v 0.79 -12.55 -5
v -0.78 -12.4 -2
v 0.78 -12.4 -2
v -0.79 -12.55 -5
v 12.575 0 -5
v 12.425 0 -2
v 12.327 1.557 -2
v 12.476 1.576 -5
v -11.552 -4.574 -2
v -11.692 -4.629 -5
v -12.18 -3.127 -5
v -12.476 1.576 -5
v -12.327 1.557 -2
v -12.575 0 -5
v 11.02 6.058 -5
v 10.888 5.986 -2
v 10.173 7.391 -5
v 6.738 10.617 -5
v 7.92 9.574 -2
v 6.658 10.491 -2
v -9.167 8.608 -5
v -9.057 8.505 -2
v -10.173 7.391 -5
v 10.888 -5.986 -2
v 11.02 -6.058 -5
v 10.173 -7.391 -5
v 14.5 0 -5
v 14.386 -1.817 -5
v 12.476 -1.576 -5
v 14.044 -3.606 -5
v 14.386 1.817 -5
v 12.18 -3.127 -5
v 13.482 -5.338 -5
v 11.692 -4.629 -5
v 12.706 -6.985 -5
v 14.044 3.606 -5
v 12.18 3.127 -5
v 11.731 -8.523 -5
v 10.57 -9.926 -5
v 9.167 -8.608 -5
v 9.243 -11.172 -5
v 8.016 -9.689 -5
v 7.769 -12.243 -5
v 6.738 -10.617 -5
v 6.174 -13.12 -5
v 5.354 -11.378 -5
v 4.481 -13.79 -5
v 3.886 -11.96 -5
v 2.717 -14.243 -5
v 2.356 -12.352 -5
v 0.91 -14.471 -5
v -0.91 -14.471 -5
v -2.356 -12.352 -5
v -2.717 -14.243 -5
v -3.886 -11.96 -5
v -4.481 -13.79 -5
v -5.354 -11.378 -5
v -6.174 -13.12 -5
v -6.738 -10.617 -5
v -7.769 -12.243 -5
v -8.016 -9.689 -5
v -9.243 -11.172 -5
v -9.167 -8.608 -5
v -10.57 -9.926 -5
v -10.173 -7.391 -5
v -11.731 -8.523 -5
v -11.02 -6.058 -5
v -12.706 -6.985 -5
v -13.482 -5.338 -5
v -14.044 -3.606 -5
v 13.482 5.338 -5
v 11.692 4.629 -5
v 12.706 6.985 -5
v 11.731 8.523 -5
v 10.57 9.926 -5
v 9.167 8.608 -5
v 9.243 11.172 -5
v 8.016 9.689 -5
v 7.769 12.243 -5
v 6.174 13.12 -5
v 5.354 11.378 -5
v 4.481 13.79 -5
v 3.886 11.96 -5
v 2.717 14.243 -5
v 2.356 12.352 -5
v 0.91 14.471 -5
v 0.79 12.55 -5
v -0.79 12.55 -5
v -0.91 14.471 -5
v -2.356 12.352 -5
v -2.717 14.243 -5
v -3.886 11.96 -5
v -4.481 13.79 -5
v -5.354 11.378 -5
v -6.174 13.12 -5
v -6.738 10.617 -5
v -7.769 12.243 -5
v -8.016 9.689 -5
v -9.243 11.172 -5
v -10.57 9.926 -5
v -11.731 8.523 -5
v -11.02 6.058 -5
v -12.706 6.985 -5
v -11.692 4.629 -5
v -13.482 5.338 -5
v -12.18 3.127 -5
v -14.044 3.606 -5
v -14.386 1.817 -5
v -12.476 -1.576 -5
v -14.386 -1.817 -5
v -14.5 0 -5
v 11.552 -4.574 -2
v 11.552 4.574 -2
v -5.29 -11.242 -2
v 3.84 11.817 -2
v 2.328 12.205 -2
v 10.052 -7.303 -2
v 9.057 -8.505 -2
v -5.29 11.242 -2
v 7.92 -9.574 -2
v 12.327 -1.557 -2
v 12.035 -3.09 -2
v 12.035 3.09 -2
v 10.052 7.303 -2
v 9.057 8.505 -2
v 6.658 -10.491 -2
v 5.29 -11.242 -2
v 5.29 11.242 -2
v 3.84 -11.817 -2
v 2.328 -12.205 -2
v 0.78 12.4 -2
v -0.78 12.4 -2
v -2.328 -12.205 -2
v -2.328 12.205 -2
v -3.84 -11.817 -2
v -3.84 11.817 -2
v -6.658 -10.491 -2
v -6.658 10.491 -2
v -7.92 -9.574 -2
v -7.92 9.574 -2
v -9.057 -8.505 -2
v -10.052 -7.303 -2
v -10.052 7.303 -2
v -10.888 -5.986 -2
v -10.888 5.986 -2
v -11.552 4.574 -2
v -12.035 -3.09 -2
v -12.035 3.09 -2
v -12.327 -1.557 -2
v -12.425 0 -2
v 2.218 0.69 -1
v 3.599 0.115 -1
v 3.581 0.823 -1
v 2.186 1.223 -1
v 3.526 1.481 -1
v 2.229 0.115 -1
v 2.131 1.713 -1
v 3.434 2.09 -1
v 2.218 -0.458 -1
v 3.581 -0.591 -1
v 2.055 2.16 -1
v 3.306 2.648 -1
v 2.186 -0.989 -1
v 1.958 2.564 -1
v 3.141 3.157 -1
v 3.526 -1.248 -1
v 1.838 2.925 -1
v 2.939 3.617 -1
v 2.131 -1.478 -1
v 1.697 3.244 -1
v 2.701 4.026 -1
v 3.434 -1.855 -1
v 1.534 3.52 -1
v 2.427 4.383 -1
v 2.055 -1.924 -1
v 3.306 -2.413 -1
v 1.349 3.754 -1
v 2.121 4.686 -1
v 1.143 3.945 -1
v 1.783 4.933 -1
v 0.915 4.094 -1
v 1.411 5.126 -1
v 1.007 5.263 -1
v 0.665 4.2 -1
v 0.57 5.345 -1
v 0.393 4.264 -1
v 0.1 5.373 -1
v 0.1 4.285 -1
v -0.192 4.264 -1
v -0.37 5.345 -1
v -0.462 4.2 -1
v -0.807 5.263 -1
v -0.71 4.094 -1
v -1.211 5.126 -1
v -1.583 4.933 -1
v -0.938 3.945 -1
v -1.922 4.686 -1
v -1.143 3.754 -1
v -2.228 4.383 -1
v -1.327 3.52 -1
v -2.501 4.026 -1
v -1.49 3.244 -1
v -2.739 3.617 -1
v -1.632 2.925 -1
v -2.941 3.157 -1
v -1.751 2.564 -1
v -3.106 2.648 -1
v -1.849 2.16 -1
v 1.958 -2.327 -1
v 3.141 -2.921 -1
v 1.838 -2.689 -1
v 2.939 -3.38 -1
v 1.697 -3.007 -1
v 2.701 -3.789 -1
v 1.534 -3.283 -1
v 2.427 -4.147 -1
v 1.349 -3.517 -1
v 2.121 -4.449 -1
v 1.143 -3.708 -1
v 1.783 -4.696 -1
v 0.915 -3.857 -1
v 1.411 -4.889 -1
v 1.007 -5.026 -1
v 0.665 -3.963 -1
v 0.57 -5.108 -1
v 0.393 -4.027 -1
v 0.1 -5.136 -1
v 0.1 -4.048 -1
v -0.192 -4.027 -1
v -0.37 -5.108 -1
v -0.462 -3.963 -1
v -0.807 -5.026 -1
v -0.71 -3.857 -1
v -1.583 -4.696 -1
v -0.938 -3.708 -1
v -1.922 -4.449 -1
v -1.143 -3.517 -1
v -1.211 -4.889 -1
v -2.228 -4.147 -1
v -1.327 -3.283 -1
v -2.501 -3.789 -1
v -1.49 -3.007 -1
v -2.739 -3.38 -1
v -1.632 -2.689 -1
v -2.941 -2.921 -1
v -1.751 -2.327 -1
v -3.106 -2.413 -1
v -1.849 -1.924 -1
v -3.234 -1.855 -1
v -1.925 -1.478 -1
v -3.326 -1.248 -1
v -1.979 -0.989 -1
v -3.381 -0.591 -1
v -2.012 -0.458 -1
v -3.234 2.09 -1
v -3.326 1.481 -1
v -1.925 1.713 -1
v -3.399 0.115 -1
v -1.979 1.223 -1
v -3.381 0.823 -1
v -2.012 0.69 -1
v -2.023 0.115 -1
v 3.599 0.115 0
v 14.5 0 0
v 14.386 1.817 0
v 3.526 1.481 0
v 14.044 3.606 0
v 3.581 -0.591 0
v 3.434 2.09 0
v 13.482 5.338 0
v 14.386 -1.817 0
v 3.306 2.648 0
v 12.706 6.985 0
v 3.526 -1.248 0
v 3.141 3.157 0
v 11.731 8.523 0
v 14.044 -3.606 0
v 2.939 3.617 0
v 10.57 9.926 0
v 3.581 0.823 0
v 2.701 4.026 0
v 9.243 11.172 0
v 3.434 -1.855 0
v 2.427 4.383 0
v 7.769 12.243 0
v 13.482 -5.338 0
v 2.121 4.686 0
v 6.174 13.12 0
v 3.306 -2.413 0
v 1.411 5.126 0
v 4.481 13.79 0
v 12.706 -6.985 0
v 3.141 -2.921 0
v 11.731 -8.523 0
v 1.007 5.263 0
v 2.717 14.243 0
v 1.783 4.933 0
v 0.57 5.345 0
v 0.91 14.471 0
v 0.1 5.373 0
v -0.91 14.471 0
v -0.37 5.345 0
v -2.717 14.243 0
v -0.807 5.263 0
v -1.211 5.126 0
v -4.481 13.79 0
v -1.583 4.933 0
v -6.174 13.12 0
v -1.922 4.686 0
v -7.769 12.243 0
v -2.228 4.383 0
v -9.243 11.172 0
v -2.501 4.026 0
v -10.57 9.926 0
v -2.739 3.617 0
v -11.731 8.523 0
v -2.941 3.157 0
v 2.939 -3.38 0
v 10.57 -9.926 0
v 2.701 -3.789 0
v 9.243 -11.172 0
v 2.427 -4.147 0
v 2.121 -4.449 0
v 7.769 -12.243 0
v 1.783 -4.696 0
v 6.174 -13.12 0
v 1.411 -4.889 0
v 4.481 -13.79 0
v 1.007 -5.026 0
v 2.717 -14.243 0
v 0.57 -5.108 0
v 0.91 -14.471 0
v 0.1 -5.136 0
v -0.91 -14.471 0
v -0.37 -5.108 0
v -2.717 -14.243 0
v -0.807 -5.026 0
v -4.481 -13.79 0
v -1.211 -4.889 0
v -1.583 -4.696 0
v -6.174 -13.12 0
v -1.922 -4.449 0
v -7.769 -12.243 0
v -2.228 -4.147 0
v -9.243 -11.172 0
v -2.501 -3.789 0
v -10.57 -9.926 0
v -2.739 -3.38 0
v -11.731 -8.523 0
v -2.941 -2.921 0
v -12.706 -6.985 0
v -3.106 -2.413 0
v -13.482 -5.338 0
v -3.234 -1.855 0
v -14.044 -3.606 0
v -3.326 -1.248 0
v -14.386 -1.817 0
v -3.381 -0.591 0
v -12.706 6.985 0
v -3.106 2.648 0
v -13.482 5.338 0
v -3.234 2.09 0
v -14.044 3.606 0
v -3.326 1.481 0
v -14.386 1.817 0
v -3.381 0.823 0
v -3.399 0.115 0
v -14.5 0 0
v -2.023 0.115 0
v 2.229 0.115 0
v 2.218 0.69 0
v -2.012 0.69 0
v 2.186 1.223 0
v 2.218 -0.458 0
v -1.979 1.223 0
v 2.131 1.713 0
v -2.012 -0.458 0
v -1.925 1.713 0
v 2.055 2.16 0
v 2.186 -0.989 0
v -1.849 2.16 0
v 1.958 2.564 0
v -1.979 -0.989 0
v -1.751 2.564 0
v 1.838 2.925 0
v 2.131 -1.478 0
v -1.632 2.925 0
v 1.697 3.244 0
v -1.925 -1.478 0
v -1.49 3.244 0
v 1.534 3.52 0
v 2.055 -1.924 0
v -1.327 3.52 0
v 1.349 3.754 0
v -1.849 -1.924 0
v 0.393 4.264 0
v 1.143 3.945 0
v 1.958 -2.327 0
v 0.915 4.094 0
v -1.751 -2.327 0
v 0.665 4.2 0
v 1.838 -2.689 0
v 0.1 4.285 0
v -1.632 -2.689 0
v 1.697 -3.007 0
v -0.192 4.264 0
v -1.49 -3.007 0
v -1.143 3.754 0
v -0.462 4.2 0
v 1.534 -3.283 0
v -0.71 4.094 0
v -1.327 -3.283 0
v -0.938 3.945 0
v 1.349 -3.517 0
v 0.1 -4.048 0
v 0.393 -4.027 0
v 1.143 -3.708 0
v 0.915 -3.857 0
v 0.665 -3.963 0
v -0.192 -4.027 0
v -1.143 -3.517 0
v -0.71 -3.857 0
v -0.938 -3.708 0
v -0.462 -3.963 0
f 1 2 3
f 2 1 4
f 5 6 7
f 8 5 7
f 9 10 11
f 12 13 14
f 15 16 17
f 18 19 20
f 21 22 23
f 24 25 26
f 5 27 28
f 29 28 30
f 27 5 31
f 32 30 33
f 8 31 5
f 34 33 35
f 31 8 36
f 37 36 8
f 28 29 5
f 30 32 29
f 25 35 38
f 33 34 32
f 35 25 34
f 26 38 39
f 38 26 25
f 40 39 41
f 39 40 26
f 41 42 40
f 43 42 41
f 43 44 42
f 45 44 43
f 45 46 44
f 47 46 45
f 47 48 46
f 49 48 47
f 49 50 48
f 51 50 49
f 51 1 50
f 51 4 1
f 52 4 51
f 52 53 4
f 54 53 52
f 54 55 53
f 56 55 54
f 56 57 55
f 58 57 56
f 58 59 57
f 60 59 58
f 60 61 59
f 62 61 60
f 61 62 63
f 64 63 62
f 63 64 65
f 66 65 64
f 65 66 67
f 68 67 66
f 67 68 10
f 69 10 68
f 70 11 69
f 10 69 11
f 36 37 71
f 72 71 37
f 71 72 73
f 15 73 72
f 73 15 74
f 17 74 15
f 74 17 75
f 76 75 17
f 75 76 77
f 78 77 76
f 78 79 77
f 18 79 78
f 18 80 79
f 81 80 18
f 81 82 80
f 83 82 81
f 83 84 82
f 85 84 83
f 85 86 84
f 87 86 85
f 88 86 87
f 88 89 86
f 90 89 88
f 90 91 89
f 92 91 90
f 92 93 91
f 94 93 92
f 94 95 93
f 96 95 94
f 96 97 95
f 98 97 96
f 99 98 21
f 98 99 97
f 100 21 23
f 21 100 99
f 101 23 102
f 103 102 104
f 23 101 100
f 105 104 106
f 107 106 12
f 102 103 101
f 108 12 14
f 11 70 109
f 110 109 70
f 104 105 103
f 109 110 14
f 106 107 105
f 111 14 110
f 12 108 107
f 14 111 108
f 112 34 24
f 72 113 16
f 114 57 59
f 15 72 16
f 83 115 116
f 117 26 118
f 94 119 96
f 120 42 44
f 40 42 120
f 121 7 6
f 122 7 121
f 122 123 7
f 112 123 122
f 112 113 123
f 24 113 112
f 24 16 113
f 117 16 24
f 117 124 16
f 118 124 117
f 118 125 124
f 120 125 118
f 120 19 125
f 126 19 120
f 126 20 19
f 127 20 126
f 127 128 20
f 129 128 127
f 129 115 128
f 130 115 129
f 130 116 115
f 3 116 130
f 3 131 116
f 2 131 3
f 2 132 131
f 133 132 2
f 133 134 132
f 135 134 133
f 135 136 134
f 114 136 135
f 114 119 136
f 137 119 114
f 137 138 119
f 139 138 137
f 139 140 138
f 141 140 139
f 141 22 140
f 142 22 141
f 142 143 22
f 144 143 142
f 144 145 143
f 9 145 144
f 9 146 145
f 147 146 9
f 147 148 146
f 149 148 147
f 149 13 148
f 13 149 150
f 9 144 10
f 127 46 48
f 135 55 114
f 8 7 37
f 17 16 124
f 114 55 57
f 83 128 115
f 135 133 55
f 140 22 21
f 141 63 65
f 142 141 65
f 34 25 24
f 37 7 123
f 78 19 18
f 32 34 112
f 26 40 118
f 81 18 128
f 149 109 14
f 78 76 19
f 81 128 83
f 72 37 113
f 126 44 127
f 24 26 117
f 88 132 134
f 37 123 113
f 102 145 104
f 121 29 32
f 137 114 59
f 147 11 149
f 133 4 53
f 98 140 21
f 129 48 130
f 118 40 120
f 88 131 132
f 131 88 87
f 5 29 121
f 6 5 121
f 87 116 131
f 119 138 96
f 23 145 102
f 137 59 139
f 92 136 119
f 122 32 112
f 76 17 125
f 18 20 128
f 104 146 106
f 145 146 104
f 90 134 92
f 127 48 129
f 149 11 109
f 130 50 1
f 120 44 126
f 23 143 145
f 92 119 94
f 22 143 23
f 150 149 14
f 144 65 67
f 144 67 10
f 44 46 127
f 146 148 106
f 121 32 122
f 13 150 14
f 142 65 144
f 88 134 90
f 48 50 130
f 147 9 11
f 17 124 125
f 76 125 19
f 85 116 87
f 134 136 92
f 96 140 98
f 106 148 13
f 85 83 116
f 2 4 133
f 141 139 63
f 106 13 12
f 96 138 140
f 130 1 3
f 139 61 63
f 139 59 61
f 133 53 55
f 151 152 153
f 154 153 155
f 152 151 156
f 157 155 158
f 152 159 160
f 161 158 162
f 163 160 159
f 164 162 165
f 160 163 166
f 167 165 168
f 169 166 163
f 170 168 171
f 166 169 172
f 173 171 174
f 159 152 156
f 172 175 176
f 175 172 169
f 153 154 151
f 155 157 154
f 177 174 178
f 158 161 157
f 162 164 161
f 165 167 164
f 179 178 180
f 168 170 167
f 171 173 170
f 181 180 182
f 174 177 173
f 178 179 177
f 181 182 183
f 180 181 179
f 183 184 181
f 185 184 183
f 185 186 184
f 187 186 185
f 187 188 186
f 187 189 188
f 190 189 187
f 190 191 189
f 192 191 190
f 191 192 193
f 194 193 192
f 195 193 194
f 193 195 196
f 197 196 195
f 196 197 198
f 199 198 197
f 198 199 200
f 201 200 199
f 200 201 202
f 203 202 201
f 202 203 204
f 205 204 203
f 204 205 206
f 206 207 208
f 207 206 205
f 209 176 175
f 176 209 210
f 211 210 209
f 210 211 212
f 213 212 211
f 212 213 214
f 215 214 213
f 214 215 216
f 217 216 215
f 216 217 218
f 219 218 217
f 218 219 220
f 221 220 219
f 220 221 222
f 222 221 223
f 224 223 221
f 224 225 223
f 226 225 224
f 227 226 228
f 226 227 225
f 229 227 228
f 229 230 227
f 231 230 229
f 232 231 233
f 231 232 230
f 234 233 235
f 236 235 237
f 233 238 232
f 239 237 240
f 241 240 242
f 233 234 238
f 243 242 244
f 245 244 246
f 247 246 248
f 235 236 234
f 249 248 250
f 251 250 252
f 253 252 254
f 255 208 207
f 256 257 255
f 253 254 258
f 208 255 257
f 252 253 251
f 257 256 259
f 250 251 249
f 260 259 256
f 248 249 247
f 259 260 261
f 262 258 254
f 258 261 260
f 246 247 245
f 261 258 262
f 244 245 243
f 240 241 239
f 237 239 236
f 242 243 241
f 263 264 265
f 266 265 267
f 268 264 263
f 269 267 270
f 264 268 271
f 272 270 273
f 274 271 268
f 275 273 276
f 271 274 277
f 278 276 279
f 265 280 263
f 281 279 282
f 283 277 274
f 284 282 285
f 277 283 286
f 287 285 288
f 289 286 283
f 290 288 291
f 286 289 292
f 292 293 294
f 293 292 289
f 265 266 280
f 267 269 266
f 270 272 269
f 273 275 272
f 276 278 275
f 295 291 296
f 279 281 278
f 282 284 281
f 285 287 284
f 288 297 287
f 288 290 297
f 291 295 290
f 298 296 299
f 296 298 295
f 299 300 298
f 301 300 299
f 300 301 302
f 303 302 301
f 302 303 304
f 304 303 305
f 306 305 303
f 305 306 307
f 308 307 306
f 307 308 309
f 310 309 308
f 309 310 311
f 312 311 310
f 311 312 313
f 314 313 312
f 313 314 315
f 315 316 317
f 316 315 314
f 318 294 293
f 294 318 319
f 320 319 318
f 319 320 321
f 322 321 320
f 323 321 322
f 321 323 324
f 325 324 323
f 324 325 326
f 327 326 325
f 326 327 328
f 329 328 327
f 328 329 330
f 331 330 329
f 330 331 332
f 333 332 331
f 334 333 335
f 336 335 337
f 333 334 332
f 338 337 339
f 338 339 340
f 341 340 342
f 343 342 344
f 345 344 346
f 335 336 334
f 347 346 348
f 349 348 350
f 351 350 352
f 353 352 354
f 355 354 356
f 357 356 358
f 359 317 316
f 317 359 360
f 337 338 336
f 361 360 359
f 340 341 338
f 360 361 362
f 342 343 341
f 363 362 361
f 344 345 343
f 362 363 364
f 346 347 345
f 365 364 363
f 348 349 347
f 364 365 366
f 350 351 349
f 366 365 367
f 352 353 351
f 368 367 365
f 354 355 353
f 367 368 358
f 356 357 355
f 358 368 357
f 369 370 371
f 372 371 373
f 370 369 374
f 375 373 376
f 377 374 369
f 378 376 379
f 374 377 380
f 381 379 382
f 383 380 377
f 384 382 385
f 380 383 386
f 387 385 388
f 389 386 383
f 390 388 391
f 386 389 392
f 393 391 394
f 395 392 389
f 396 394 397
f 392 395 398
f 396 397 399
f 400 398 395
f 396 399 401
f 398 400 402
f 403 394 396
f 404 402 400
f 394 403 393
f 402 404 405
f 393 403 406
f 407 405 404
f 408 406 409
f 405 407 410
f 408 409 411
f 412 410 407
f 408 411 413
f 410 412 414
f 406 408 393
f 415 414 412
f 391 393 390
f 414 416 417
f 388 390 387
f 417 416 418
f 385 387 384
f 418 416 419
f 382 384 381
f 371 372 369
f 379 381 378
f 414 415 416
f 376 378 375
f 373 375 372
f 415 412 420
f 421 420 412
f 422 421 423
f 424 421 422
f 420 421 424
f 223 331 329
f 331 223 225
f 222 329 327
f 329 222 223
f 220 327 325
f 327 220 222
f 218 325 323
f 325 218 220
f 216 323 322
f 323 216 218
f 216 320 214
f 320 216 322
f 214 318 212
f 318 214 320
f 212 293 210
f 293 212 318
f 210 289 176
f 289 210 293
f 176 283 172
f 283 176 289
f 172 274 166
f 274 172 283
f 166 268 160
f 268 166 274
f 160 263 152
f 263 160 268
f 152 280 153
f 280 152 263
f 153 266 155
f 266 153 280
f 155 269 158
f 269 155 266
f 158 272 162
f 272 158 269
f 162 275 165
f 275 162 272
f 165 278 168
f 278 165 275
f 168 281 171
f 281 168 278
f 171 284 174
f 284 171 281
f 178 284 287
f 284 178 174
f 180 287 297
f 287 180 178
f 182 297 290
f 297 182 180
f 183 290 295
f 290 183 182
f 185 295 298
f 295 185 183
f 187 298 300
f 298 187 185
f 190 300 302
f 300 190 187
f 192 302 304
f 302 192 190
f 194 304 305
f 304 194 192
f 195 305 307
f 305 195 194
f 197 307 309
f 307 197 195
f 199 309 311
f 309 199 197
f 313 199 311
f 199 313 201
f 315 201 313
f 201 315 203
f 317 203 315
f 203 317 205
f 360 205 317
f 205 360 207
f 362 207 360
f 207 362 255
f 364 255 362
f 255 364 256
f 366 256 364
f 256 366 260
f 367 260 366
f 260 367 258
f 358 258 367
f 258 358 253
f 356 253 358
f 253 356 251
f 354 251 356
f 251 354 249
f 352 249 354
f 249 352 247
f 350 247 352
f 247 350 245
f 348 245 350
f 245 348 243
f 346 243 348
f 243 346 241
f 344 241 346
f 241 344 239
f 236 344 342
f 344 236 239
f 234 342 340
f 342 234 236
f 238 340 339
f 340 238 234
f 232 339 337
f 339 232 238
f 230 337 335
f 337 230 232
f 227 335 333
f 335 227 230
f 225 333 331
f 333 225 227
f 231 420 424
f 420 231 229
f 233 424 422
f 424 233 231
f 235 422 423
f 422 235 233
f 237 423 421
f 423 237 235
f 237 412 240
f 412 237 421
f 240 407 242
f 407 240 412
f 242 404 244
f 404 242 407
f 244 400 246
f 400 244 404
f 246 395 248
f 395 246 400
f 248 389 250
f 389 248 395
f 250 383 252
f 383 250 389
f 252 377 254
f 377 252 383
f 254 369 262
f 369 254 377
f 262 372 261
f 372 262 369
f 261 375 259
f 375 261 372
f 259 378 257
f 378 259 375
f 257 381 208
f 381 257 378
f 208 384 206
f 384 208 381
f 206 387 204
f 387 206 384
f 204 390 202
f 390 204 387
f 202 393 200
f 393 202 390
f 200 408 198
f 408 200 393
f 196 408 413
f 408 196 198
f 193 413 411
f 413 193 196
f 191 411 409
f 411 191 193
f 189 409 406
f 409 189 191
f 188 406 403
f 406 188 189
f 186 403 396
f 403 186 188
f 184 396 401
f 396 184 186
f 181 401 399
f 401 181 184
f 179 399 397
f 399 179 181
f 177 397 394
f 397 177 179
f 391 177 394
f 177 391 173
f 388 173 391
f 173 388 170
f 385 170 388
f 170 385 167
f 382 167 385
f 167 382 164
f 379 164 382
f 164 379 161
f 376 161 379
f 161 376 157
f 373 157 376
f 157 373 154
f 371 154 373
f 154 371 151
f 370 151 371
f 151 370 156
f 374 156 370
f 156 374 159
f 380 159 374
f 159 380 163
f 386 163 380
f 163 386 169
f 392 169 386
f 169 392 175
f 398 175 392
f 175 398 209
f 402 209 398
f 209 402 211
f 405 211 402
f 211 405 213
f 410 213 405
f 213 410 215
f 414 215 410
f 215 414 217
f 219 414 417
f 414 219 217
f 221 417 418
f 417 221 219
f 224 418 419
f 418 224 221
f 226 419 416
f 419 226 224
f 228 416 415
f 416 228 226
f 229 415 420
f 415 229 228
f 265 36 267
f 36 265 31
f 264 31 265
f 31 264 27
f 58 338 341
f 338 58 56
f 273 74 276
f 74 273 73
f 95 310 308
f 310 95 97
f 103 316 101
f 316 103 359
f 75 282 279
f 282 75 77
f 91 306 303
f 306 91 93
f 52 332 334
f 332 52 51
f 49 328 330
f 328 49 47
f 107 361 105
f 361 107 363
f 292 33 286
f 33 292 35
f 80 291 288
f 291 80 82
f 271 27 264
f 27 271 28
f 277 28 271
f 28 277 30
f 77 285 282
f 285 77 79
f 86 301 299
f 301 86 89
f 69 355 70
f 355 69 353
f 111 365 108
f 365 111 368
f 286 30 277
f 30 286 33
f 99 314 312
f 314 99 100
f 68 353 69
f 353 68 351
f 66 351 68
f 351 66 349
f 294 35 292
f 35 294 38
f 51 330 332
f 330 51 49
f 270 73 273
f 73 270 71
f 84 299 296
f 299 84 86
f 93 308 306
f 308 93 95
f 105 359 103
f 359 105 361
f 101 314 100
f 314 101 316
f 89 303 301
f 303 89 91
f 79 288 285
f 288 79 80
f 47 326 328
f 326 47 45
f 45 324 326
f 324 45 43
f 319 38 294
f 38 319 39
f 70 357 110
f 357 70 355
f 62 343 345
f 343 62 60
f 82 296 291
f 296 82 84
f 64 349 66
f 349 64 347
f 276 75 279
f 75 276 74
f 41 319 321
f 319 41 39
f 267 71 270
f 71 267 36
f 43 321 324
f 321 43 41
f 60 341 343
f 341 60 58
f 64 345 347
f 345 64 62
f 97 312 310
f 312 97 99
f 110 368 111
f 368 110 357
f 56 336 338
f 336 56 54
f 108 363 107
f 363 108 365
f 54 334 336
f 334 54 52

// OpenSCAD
$fn = 50;


difference() {
	union() {
		translate(v = [0, 0, -5.0000000000]) {
			cylinder(h = 5, r = 14.5000000000);
		}
	}
	union() {
		#translate(v = [0, 0, -5.0000000000]) {
			cylinder(h = 3, r1 = 12.5750000000, r2 = 12.4250000000);
		}
		translate(v = [0, 0, -1]) {
			linear_extrude(height = 1) {
				text(font = "Impact", halign = "center", size = 10, text = "0", valign = "center");
			}
		}
	}
}
